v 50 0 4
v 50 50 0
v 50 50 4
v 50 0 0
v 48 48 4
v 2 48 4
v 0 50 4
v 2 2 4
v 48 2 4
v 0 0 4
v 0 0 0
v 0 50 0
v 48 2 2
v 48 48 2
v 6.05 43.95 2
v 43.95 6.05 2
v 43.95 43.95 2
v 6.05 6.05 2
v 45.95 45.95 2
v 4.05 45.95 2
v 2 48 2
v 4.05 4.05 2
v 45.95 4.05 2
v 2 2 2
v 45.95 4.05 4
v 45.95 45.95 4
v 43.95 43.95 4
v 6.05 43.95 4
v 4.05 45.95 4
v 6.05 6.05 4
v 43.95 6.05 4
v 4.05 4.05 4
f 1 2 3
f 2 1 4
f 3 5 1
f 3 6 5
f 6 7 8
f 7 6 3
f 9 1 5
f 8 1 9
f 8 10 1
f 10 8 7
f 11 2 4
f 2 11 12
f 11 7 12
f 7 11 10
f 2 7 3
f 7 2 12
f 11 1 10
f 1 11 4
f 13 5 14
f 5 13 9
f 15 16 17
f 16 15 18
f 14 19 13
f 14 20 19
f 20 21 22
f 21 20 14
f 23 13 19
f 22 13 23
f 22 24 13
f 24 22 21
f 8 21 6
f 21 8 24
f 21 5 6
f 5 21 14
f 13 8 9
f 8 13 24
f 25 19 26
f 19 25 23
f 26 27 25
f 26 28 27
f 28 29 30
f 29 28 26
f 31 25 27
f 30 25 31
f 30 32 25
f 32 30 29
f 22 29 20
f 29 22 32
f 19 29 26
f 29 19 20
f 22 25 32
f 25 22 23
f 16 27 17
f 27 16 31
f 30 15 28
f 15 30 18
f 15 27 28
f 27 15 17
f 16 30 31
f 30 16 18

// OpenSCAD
sheet_thickness = 2.05;
wall_thickness = 2;

bracket_edge_length = 50;
bracket_height = 4;

wall_cutout = bracket_edge_length - (wall_thickness * 2);

inner_wall_offset = wall_thickness + sheet_thickness;
inner_wall = bracket_edge_length - (inner_wall_offset * 2);

inner_cutout_offset = inner_wall_offset + wall_thickness;
inner_cutout = bracket_edge_length - (inner_cutout_offset * 2);


difference() {
    cube([bracket_edge_length, bracket_edge_length, bracket_height]);

    translate([wall_thickness, wall_thickness, wall_thickness]) {
        cube([wall_cutout, wall_cutout, wall_thickness]);
    }
}

difference() {
    translate([inner_wall_offset, inner_wall_offset, wall_thickness]) {
        cube([inner_wall, inner_wall, wall_thickness]);
    }

    translate([inner_cutout_offset, inner_cutout_offset, wall_thickness]) {
        cube([inner_cutout, inner_cutout, wall_thickness]);
    }
}
